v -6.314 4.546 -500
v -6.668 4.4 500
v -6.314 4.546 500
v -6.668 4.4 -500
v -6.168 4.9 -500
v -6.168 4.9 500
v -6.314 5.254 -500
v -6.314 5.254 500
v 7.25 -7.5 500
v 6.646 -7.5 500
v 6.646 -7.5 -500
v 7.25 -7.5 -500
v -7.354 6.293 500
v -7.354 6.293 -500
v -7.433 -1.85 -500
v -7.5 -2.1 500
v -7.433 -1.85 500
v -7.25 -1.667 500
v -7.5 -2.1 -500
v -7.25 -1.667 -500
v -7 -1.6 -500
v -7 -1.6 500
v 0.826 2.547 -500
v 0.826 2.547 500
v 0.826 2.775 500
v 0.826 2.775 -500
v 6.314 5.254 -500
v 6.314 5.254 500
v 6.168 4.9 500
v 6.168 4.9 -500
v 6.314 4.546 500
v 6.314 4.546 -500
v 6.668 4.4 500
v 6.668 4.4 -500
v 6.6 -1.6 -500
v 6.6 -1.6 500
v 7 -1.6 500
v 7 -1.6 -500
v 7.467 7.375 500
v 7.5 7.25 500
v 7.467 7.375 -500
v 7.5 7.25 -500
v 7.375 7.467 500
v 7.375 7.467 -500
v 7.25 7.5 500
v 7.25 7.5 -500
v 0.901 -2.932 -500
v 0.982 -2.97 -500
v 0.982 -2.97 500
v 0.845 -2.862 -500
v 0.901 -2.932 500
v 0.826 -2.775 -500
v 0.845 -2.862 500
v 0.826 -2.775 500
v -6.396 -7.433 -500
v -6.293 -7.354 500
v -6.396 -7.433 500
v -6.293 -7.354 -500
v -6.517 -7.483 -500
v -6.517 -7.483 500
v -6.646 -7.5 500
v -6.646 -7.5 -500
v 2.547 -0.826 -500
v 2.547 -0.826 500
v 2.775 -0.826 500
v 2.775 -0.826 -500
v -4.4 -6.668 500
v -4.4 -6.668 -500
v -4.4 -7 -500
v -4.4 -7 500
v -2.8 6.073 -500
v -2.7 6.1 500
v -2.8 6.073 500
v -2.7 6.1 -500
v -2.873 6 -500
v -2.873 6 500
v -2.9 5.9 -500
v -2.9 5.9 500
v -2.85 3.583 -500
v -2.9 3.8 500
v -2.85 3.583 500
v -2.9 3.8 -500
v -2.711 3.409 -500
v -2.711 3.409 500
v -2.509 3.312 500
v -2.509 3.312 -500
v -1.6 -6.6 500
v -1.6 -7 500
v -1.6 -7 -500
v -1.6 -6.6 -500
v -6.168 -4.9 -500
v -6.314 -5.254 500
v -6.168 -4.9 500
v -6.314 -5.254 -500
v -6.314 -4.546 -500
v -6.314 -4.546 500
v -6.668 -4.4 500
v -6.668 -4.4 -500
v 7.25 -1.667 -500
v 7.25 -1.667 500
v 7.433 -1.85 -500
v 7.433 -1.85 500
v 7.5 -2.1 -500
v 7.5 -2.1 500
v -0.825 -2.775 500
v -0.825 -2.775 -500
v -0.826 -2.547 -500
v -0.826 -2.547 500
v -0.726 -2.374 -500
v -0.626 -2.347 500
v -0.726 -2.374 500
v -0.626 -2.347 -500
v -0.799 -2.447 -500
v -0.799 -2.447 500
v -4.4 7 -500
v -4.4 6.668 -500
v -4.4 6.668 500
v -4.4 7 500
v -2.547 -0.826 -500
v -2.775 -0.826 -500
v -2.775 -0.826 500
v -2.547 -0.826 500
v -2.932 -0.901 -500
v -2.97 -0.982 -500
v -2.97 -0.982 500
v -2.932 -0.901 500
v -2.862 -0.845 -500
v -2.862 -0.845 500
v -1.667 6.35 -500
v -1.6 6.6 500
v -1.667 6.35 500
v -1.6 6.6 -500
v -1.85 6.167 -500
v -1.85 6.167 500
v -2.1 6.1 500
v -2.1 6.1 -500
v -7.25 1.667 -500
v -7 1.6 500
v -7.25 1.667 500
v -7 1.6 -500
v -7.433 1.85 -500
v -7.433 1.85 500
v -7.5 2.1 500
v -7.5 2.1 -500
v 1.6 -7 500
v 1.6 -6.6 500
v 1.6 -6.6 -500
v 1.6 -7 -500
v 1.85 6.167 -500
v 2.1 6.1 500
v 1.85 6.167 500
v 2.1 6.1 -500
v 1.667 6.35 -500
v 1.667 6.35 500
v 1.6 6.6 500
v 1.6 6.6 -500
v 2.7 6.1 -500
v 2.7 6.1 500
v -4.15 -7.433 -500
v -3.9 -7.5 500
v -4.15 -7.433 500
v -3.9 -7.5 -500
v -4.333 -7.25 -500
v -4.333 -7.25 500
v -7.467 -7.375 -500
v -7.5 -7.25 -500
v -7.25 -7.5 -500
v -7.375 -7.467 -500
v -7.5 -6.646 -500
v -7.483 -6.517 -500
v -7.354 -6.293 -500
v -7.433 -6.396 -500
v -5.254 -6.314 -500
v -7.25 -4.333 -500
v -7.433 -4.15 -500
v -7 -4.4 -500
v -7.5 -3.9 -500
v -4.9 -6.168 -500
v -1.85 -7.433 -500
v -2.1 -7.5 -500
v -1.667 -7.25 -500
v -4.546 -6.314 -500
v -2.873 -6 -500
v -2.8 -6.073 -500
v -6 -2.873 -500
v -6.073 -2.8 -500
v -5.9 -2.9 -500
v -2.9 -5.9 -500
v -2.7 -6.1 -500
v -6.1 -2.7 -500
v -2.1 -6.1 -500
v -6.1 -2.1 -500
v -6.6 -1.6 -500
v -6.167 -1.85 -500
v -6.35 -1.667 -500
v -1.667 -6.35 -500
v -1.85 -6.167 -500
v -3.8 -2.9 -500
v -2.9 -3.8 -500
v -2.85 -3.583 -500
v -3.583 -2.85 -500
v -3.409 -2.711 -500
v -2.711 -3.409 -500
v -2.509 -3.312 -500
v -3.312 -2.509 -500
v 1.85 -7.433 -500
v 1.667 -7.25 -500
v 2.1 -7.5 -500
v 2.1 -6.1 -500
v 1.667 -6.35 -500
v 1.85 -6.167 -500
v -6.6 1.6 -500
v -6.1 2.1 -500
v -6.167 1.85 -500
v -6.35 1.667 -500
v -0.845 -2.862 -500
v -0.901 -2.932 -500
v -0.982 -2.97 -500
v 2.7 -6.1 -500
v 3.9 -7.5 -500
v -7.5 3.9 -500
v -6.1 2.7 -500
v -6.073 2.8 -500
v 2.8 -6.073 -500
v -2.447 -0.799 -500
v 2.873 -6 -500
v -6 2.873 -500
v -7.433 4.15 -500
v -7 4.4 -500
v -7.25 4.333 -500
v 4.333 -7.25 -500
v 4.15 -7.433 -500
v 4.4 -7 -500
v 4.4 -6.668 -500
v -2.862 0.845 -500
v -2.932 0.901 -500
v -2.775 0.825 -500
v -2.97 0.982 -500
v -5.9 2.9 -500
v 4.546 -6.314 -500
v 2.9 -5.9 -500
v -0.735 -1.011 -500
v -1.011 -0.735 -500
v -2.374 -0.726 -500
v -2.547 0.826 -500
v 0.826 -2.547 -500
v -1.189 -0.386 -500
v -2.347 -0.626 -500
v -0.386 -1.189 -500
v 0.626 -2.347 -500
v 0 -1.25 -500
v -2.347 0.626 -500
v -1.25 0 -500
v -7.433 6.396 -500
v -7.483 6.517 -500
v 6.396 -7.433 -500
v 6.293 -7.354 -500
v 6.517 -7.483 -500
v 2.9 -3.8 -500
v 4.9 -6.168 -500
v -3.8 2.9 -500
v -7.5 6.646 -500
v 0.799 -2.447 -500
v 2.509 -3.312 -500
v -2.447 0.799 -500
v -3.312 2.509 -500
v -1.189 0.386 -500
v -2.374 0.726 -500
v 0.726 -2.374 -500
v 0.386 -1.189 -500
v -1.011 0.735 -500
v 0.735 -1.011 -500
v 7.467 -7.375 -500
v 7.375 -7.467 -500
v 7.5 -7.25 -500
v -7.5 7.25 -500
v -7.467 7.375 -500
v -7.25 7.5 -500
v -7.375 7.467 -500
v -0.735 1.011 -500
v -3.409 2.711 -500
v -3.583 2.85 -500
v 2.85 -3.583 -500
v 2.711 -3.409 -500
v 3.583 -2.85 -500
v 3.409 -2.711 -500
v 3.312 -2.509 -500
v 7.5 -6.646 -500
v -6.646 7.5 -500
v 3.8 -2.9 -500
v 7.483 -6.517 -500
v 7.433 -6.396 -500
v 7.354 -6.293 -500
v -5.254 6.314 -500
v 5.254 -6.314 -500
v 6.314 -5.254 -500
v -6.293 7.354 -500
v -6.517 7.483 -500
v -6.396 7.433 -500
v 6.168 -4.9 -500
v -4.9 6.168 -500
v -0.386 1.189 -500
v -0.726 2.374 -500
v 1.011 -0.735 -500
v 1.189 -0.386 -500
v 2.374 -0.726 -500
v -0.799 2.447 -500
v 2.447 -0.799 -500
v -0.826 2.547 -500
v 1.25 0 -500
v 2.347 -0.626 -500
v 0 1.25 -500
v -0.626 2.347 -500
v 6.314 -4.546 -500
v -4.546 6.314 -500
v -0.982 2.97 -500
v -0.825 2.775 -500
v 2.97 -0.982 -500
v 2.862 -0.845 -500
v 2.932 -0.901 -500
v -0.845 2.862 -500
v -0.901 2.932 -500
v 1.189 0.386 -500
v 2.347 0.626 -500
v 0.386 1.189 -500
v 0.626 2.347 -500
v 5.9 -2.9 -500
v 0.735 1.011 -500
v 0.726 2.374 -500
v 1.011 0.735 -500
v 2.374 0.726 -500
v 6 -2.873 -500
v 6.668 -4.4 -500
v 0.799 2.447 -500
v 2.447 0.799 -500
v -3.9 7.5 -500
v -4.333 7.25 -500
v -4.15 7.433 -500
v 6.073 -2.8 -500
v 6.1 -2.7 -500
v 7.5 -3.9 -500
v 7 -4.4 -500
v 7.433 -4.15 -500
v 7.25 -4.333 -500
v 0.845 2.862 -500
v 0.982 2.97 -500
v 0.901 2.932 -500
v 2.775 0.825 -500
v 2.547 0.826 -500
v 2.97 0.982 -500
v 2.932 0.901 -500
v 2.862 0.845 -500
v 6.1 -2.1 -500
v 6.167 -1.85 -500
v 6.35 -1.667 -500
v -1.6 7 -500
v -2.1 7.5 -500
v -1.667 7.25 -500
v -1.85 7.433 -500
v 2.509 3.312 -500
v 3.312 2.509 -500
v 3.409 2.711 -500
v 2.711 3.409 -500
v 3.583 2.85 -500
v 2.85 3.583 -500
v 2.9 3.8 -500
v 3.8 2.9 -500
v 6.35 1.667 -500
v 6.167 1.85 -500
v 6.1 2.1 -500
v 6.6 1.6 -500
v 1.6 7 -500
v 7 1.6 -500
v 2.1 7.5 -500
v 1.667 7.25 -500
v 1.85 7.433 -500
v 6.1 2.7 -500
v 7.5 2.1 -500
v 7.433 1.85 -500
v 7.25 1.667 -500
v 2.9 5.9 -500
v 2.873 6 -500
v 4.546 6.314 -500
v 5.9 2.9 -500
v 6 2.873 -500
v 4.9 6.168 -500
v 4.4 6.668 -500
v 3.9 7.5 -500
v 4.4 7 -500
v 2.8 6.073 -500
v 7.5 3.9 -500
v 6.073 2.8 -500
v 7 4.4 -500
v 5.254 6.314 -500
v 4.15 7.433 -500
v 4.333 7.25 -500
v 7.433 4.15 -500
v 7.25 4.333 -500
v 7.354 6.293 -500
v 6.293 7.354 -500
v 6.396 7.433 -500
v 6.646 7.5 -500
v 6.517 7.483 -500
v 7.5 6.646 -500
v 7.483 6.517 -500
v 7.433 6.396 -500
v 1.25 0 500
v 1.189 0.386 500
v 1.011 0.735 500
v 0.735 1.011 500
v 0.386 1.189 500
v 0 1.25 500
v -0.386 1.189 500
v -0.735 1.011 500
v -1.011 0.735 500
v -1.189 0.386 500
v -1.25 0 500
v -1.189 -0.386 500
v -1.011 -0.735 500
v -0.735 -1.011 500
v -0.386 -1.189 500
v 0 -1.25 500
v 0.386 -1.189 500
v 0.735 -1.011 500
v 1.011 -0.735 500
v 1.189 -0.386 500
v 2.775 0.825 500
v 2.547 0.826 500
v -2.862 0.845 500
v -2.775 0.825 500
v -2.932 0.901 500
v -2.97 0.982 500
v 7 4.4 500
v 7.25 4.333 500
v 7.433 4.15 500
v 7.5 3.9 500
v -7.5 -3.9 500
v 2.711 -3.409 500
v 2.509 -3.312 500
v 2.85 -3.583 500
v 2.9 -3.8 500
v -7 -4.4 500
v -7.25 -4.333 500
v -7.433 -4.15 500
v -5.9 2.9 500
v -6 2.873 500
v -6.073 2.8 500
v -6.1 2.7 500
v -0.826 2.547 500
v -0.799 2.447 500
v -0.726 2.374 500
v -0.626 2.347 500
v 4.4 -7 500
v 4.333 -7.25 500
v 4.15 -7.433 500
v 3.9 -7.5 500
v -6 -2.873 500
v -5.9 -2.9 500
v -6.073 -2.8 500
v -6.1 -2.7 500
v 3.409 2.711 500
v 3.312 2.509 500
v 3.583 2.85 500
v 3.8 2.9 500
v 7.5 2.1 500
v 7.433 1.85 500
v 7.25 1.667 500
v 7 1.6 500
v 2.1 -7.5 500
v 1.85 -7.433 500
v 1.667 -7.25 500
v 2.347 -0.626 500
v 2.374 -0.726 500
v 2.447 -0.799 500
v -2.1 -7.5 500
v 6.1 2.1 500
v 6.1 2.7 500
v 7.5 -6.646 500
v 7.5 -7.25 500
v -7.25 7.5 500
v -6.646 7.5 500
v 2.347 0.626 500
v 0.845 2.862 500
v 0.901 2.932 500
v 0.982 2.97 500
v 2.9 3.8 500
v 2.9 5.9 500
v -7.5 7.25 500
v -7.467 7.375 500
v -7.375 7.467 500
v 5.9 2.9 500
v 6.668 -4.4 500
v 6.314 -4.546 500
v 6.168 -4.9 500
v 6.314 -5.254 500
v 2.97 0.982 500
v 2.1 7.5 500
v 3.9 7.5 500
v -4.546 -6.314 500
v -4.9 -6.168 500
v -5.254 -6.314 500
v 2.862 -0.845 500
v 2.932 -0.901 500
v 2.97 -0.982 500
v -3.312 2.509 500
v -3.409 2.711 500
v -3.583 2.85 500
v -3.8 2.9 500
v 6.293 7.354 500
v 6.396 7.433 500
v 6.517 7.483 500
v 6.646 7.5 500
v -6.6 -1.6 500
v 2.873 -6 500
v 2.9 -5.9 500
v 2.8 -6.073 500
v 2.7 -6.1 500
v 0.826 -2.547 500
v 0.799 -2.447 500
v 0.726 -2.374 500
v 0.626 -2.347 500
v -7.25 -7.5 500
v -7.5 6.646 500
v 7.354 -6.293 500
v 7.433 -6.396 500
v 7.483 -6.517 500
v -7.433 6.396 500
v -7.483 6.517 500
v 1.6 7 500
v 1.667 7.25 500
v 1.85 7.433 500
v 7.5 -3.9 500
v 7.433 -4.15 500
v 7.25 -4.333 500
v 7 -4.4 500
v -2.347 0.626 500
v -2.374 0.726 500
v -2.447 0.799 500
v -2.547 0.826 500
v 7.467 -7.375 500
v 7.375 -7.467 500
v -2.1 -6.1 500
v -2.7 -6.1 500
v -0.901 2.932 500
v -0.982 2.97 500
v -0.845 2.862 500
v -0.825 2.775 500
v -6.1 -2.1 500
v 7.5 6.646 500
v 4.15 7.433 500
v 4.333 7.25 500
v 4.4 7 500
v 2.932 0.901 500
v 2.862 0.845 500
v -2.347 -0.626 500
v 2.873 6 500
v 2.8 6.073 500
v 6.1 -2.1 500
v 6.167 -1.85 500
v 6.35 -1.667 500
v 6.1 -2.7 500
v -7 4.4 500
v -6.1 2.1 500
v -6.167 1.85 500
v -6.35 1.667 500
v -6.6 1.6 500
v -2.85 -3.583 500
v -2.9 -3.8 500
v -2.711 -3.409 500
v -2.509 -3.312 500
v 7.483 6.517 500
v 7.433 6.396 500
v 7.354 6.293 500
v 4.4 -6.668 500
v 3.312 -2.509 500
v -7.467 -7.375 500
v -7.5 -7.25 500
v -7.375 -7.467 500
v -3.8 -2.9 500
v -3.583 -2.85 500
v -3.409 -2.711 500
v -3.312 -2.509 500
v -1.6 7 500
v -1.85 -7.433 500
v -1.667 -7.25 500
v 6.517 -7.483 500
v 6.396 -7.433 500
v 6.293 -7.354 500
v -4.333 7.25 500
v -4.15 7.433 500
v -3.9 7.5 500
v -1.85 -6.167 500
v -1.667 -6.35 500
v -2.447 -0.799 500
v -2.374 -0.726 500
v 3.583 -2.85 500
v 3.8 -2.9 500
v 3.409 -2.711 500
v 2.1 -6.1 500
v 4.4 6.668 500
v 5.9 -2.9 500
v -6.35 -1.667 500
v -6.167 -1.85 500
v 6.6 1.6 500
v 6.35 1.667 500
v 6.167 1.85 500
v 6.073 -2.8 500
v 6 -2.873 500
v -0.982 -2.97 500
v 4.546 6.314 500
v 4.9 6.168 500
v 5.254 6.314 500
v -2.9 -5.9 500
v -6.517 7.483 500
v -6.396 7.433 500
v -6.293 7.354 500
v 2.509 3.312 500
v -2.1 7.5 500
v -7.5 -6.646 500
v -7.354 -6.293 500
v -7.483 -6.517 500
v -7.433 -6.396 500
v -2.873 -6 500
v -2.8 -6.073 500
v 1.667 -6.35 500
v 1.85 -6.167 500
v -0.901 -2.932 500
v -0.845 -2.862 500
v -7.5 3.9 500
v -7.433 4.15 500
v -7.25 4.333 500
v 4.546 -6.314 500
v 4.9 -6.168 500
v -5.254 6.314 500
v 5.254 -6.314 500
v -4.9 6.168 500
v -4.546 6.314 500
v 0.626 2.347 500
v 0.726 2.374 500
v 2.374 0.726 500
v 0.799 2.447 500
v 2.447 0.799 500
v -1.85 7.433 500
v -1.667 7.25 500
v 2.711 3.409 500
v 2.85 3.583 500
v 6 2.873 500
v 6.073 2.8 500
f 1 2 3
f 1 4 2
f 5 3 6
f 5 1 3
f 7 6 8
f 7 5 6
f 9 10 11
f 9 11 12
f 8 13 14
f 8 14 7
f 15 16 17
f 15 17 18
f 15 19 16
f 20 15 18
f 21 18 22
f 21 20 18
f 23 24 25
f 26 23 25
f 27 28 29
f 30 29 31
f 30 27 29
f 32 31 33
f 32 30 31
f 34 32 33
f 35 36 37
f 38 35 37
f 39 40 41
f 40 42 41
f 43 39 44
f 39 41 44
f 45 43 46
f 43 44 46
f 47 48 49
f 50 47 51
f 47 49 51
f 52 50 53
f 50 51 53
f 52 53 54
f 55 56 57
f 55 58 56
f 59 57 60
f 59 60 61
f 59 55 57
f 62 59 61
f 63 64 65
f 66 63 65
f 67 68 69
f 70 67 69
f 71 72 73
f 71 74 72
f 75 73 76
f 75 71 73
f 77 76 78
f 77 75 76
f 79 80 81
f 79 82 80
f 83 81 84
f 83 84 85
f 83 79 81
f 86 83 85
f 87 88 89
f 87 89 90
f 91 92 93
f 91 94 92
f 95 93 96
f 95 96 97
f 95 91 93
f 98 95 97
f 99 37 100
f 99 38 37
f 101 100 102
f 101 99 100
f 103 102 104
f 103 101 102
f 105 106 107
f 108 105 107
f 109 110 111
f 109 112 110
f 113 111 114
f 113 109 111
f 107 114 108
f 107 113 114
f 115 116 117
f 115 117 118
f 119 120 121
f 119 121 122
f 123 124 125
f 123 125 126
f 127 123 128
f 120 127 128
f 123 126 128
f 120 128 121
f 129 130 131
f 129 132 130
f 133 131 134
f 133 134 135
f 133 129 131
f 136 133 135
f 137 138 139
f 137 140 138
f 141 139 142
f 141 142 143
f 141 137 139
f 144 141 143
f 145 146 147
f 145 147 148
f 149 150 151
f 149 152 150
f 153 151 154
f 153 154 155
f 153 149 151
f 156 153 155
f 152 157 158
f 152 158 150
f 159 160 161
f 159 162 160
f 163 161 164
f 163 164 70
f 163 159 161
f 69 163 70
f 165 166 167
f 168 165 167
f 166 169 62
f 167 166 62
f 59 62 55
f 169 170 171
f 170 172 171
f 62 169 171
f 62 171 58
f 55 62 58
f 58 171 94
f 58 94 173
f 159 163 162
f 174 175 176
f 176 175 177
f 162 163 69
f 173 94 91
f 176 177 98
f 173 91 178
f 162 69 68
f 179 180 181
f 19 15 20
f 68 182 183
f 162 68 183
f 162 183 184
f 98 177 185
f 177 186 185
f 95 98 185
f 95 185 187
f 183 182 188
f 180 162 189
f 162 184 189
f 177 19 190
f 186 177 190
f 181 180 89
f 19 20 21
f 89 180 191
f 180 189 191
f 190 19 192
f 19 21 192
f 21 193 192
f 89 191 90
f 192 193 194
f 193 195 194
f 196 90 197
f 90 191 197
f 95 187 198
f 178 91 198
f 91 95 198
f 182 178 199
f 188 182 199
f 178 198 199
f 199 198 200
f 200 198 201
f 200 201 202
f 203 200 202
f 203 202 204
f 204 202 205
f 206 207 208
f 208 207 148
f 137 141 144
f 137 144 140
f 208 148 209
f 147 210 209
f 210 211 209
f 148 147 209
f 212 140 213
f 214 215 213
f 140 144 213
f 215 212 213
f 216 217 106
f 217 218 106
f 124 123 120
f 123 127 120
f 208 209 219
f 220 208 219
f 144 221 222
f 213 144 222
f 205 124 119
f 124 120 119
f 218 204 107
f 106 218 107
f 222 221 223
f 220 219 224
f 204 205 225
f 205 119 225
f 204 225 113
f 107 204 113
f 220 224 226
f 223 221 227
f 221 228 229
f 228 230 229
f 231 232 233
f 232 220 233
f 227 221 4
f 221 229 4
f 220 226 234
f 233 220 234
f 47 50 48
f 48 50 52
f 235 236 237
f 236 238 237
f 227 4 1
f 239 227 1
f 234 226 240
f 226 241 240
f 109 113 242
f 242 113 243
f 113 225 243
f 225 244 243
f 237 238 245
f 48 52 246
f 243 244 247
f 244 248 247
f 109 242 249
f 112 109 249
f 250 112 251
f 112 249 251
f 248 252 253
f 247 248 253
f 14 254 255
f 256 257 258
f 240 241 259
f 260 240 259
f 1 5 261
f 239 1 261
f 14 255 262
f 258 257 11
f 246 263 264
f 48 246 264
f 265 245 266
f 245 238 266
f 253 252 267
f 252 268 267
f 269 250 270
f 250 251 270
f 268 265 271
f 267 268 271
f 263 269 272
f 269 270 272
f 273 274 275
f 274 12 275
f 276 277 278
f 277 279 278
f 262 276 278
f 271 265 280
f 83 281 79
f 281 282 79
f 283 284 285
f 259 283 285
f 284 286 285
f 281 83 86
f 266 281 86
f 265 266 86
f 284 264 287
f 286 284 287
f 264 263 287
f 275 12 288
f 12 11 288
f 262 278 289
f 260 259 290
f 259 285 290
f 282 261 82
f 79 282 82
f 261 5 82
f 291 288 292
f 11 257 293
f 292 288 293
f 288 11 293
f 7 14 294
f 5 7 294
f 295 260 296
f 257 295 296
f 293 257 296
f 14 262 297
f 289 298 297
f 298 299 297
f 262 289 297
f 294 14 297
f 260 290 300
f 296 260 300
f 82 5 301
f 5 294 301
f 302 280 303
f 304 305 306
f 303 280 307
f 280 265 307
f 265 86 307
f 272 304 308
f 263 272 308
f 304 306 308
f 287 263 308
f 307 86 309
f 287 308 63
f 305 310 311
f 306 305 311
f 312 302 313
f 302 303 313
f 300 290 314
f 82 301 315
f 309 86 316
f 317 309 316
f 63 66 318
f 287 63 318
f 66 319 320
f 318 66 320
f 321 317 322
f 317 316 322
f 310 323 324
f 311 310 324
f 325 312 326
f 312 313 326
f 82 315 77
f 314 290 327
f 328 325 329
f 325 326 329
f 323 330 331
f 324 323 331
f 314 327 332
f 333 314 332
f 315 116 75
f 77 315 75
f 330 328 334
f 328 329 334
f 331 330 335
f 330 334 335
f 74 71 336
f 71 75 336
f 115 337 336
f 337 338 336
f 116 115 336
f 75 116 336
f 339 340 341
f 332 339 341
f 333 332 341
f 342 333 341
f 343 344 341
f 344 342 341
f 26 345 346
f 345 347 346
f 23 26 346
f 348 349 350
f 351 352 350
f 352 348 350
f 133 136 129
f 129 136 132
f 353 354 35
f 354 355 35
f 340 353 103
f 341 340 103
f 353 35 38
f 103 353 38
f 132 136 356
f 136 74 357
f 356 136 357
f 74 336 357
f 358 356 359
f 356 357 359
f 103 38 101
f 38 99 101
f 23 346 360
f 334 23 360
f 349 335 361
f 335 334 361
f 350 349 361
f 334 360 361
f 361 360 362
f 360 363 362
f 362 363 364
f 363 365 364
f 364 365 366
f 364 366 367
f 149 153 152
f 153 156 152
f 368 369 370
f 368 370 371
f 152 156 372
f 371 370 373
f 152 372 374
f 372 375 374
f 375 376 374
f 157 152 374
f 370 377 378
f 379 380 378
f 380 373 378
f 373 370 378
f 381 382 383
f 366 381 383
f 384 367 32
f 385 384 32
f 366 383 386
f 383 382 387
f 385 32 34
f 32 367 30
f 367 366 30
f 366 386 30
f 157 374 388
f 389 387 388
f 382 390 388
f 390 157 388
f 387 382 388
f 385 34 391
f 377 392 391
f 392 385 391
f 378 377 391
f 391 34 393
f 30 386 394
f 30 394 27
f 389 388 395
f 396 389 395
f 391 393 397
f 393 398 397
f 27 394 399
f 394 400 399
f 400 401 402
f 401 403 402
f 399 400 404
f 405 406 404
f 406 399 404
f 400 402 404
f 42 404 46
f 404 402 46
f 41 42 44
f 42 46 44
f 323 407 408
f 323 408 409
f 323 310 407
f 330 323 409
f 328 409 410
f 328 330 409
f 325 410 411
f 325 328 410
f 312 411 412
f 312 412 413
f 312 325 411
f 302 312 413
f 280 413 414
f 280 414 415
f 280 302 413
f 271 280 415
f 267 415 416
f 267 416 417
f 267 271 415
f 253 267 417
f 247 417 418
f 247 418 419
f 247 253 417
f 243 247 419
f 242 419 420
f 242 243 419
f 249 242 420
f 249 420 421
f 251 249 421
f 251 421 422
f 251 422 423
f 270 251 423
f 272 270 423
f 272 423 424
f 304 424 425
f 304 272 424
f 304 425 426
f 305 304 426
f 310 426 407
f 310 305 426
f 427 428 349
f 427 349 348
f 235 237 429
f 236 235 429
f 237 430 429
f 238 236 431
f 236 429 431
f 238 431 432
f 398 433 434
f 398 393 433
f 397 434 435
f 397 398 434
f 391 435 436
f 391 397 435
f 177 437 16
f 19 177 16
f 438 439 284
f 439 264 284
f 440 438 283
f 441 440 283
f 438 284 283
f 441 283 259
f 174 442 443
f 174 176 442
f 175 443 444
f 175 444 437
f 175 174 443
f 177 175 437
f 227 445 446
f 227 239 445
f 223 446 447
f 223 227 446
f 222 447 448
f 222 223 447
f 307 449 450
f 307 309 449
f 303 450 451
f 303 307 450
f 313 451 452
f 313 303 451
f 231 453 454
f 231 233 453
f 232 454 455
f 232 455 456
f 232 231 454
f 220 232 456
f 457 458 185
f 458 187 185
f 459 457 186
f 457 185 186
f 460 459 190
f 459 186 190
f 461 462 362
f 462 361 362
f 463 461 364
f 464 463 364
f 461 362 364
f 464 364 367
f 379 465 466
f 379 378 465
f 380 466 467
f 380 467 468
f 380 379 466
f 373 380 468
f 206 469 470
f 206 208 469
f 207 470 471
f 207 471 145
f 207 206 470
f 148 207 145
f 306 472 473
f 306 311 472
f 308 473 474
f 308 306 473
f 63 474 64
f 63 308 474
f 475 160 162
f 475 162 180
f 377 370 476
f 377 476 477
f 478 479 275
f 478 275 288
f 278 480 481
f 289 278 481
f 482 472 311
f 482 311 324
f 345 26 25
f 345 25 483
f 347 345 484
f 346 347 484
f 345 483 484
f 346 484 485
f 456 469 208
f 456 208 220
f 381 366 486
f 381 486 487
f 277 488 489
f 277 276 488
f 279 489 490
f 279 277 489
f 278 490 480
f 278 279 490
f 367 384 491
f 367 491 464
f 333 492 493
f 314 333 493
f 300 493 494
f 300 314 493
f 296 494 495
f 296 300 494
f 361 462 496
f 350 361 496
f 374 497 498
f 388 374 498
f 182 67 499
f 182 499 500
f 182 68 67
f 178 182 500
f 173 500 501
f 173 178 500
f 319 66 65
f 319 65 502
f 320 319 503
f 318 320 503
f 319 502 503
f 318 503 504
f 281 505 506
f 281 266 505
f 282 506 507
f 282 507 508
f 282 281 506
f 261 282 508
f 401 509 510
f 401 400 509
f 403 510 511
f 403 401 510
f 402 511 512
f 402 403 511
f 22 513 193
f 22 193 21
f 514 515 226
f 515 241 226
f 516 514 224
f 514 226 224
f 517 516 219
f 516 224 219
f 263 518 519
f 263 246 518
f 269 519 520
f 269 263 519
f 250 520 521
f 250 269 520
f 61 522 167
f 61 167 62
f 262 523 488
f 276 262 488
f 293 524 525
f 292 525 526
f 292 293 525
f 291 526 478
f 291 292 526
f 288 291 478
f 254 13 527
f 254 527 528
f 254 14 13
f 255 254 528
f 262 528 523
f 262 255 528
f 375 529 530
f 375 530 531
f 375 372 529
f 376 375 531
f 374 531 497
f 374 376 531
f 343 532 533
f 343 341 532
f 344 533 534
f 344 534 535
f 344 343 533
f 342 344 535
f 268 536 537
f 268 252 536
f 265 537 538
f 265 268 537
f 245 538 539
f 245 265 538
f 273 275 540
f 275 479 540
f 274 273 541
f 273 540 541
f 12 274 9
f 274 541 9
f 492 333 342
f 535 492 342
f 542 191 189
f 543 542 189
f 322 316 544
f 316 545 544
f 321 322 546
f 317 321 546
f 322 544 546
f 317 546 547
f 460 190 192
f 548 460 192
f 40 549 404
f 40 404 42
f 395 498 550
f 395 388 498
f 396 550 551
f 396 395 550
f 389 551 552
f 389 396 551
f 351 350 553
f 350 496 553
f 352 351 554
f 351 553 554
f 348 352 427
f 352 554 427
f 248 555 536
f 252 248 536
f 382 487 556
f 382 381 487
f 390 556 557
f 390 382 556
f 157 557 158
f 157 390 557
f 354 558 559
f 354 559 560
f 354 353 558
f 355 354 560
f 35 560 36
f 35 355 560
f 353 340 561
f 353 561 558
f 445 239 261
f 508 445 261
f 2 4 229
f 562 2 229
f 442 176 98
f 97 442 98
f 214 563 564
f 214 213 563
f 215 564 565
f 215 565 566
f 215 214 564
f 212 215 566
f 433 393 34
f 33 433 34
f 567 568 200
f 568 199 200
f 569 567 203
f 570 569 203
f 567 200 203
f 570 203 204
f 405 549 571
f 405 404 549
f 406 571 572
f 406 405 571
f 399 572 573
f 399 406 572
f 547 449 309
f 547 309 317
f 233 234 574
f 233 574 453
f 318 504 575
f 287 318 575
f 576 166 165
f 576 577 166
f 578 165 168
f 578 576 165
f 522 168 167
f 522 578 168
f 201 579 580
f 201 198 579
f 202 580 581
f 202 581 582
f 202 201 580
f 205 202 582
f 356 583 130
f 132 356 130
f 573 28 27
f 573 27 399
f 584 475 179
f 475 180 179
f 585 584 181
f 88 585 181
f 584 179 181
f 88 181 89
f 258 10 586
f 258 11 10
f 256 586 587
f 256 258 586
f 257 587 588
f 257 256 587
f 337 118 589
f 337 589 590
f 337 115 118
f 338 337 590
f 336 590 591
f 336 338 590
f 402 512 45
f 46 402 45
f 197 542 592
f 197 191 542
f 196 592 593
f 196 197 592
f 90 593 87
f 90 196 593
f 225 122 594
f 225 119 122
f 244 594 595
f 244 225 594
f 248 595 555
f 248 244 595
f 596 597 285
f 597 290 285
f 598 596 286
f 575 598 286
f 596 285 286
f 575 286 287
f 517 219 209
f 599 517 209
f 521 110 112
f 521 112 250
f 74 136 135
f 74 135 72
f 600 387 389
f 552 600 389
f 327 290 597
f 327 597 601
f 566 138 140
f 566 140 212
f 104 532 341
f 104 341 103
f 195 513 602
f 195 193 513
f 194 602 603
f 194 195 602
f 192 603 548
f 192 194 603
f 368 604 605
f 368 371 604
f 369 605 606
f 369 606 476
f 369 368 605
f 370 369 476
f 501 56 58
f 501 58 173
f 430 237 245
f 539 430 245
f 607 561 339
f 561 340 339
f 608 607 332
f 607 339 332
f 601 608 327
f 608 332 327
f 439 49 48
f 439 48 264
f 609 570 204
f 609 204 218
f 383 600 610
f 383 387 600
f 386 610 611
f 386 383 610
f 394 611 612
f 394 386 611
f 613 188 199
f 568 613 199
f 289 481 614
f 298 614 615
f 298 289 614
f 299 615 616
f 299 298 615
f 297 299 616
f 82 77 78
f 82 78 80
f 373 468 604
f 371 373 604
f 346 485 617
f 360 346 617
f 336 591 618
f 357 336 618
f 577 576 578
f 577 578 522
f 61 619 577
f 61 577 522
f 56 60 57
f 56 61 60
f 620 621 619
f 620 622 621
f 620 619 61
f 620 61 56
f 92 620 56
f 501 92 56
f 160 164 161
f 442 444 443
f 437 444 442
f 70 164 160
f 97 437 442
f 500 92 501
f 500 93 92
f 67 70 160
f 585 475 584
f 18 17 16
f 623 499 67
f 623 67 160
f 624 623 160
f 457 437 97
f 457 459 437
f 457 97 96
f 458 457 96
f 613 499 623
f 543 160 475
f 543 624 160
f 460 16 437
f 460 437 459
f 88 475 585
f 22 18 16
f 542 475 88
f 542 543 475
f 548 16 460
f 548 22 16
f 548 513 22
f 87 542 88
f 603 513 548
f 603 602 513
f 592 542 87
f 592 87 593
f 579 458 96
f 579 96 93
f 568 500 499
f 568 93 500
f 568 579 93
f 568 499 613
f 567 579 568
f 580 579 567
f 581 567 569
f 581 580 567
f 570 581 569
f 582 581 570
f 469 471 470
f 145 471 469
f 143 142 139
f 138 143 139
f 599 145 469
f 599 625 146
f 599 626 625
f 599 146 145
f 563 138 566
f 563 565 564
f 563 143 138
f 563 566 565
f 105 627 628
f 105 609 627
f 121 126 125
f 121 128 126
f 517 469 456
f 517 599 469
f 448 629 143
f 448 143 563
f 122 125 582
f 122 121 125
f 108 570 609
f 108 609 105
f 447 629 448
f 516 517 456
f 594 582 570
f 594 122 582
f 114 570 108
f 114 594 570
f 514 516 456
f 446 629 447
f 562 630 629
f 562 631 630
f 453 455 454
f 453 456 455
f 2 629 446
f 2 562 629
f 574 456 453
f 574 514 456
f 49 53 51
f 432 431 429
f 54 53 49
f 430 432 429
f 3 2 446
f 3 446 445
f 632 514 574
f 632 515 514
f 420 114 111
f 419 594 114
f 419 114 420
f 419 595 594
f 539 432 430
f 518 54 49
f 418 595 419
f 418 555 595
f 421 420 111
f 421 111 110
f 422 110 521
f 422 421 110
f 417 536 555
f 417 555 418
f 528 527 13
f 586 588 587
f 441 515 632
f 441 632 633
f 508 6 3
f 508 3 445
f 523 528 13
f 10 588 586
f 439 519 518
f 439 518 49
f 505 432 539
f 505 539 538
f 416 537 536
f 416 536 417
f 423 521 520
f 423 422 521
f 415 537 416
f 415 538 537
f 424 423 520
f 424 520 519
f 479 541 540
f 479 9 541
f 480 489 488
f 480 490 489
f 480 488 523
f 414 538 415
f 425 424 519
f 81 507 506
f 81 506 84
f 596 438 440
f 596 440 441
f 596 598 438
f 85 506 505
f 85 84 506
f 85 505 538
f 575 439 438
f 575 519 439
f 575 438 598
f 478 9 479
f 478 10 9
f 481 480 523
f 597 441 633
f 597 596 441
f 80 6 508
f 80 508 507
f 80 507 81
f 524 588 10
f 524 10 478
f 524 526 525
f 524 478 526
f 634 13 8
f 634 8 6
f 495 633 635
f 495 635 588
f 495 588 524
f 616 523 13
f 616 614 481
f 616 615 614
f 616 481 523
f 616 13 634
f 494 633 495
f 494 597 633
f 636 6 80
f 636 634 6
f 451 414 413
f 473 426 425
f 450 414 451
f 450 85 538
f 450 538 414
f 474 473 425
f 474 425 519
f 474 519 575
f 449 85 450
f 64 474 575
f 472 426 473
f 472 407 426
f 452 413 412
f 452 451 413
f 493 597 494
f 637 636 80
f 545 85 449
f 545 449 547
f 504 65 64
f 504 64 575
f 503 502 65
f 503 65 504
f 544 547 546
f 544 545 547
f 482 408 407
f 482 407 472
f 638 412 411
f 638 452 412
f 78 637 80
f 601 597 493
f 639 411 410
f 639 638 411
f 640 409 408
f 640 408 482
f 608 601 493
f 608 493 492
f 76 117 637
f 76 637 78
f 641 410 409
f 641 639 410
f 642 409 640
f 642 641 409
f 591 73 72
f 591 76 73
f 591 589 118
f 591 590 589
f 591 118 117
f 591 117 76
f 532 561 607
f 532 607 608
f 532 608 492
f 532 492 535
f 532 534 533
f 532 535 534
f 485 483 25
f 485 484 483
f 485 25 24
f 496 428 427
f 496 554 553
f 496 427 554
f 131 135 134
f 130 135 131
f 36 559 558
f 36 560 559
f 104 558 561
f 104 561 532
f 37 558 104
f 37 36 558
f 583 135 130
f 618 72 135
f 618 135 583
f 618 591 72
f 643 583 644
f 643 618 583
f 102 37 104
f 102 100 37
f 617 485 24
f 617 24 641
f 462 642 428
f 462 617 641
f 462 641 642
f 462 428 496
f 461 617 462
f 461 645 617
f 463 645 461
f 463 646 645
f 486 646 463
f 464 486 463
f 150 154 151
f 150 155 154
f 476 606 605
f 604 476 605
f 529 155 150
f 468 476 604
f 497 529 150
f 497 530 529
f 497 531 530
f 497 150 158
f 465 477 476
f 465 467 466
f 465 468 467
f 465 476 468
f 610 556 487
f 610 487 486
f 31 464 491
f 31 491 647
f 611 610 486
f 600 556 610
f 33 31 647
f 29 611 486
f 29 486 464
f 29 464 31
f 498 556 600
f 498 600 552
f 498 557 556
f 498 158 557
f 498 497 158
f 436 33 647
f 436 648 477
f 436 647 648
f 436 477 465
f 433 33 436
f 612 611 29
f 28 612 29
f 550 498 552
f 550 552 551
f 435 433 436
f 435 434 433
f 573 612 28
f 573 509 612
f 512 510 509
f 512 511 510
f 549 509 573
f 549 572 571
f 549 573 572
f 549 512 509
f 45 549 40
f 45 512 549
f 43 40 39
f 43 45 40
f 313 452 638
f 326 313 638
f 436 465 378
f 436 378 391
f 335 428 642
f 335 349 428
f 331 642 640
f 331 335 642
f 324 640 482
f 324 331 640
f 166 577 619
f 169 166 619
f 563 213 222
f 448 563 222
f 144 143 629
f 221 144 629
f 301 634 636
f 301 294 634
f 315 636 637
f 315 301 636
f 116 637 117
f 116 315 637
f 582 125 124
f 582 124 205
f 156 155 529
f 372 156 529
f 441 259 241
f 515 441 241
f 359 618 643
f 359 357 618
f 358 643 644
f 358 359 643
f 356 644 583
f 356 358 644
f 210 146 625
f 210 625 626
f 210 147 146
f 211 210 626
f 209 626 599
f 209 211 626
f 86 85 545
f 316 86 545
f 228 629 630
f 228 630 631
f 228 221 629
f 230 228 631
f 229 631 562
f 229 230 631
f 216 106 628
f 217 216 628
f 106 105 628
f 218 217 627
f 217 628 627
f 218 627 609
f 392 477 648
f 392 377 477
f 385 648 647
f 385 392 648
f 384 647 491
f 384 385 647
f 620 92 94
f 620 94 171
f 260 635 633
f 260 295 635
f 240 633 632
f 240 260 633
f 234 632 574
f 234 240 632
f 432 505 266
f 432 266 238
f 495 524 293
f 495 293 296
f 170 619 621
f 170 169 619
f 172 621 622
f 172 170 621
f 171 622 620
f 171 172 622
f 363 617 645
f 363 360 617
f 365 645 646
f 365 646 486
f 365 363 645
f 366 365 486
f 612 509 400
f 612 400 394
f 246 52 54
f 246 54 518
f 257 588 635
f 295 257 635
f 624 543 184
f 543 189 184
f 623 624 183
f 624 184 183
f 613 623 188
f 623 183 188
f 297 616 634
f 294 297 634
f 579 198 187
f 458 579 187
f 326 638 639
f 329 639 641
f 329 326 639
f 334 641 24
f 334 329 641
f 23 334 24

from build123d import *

# Parameters (mm, degrees)
SKETCH1_W           = 15
SKETCH1_H           = 15
SKETCH1_R           = 1.25
BOSS_EXTRUDE1_DEPTH = 500
FILLET1_R           = 0.25
CUT_EXTRUDE1_DEPTH  = 1001
CUT_EXTRUDE3_DEPTH  = 1001
FILLET3_R           = 0.5
FILLET4_R           = 0.5
FILLET5_R           = 3
FILLET6_R           = 0.2
CUT_EXTRUDE4_DEPTH  = 1001
FILLET8_R           = 0.5
SKETCH6_W           = 5.1529354
SKETCH6_H           = 1.651
SKETCH6_W_2         = 1.651
SKETCH6_H_2         = 5.1529354
CUT_EXTRUDE5_DEPTH  = 1001
FILLET10_R          = 0.2


with BuildPart() as part:
    # Sketch1 → Boss-Extrude1 (new body, symmetric)
    with BuildSketch(Plane.XY):
        Rectangle(SKETCH1_W, SKETCH1_H)
        Circle(SKETCH1_R, mode=Mode.SUBTRACT)
    extrude(amount=BOSS_EXTRUDE1_DEPTH, both=True)

    # Fillet1
    fillet1_edges = [part.edges().sort_by_distance(p)[0] for p in [
        (7.5, -7.5, 0),
        (-7.5, -7.5, 0),
        (-7.5, 7.5, 0),
        (7.5, 7.5, 0),
    ]]
    fillet(fillet1_edges, radius=FILLET1_R)

    # Sketch2 → Cut-Extrude1 (cut, through all)
    with BuildSketch(Plane.XY.offset(500)):
        Polygon((-7.5, 1.6), (-6.1, 1.6), (-6.1, 2.9), (-3.4, 2.9), (-3.4, -2.9), (-6.1, -2.9), (-6.1, -1.6), (-7.5, -1.6), align=None)
        Polygon((2.9, 6.1), (1.6, 6.1), (1.6, 7.5), (-1.6, 7.5), (-1.6, 6.1), (-2.9, 6.1), (-2.9, 3.4), (2.9, 3.4), align=None)
        Polygon((-1.6, -7.5), (-1.6, -6.1), (-2.9, -6.1), (-2.9, -3.4), (2.9, -3.4), (2.9, -6.1), (1.6, -6.1), (1.6, -7.5), align=None)
        Polygon((6.1, -2.9), (6.1, -1.6), (7.5, -1.6), (7.5, 1.6), (6.1, 1.6), (6.1, 2.9), (3.4, 2.9), (3.4, -2.9), align=None)
    extrude(amount=-CUT_EXTRUDE1_DEPTH, mode=Mode.SUBTRACT)

    # Sketch4 → Cut-Extrude3 (cut, through all)
    with BuildSketch(Plane.XY.offset(500)):
        Polygon((-3.4, 2.9), (-2.75, 0), (-3.4, -2.9), align=None)
        Polygon((-2.9, 3.4), (0, 2.75), (2.9, 3.4), align=None)
        Polygon((3.4, 2.9), (2.75, 0), (3.4, -2.9), align=None)
        Polygon((-2.9, -3.4), (0, -2.75), (2.9, -3.4), align=None)
    extrude(amount=-CUT_EXTRUDE3_DEPTH, mode=Mode.SUBTRACT)

    # Fillet3
    fillet3_edges = [part.edges().sort_by_distance(p)[0] for p in [
        (1.6, -7.5, 0),
        (-1.6, -7.5, 0),
        (-1.6, -6.1, 0),
        (1.6, -6.1, 0),
        (6.1, 1.6, 0),
        (7.5, 1.6, 0),
        (7.5, -1.6, 0),
        (6.1, -1.6, 0),
        (-7.5, -1.6, 0),
        (-7.5, 1.6, 0),
        (-6.1, 1.6, 0),
        (-6.1, -1.6, 0),
        (-1.6, 6.1, 0),
        (-1.6, 7.5, 0),
        (1.6, 7.5, 0),
        (1.6, 6.1, 0),
    ]]
    fillet(fillet3_edges, radius=FILLET3_R)

    # Fillet4
    fillet4_edges = [part.edges().sort_by_distance(p)[0] for p in [
        (-2.9, -3.4, 0),
        (2.9, -3.4, 0),
        (3.4, -2.9, 0),
        (3.4, 2.9, 0),
        (-3.4, 2.9, 0),
        (-3.4, -2.9, 0),
        (2.9, 3.4, 0),
        (-2.9, 3.4, 0),
    ]]
    fillet(fillet4_edges, radius=FILLET4_R)

    # Fillet5
    fillet5_edges = [part.edges().sort_by_distance(p)[0] for p in [
        (-2.75, 0, 0),
        (0, 2.75, 0),
        (2.75, 0, 0),
        (0, -2.75, 0),
    ]]
    fillet(fillet5_edges, radius=FILLET5_R)

    # Fillet6
    fillet6_edges = [part.edges().sort_by_distance(p)[0] for p in [
        (-2.9, -6.1, 0),
        (2.9, -6.1, 0),
        (6.1, -2.9, 0),
        (6.1, 2.9, 0),
        (-6.1, 2.9, 0),
        (-6.1, -2.9, 0),
        (2.9, 6.1, 0),
        (-2.9, 6.1, 0),
    ]]
    fillet(fillet6_edges, radius=FILLET6_R)

    # Sketch5 → Cut-Extrude4 (cut, through all)
    with BuildSketch(Plane.XY.offset(500)):
        Polygon((-7.5, 6.439339828), (-5.460660172, 4.4), (-7.5, 4.4), align=None)
        Polygon((-6.439339828, 7.5), (-4.4, 5.460660172), (-4.4, 7.5), align=None)
        Polygon((4.4, 7.5), (6.439339828, 7.5), (4.4, 5.460660172), align=None)
        Polygon((7.5, 6.439339828), (7.5, 4.4), (5.460660172, 4.4), align=None)
        Polygon((7.5, -6.439339828), (5.460660172, -4.4), (7.5, -4.4), align=None)
        Polygon((6.439339828, -7.5), (4.4, -5.460660172), (4.4, -7.5), align=None)
        Polygon((-4.4, -7.5), (-6.439339828, -7.5), (-4.4, -5.460660172), align=None)
        Polygon((-7.5, -6.439339828), (-7.5, -4.4), (-5.460660172, -4.4), align=None)
    extrude(amount=-CUT_EXTRUDE4_DEPTH, mode=Mode.SUBTRACT)

    # Fillet8
    fillet8_edges = [part.edges().sort_by_distance(p)[0] for p in [
        (-7.5, 4.4, 0),
        (-7.5, 6.439339828, 0),
        (-5.460660172, 4.4, 0),
        (7.5, -4.4, 0),
        (7.5, -6.439339828, 0),
        (5.460660172, -4.4, 0),
        (5.460660172, 4.4, 0),
        (7.5, 6.439339828, 0),
        (7.5, 4.4, 0),
        (-4.4, 7.5, 0),
        (-4.4, 5.460660172, 0),
        (-6.439339828, 7.5, 0),
        (-5.460660172, -4.4, 0),
        (-7.5, -6.439339828, 0),
        (-7.5, -4.4, 0),
        (4.4, 5.460660172, 0),
        (4.4, 7.5, 0),
        (6.439339828, 7.5, 0),
        (6.439339828, -7.5, 0),
        (4.4, -7.5, 0),
        (4.4, -5.460660172, 0),
        (-6.439339828, -7.5, 0),
        (-4.4, -5.460660172, 0),
        (-4.4, -7.5, 0),
    ]]
    fillet(fillet8_edges, radius=FILLET8_R)

    # Sketch6 → Cut-Extrude5 (cut, through all)
    with BuildSketch(Plane.XY.offset(500)):
        with Locations((4.9235323, 0)):
            Rectangle(SKETCH6_W, SKETCH6_H)
        with Locations((0, -4.9235323)):
            Rectangle(SKETCH6_W_2, SKETCH6_H_2)
        with Locations((-4.9235323, 0)):
            Rectangle(SKETCH6_W, SKETCH6_H)
        with Locations((0, 4.9235323)):
            Rectangle(SKETCH6_W_2, SKETCH6_H_2)
    extrude(amount=-CUT_EXTRUDE5_DEPTH, mode=Mode.SUBTRACT)

    # Fillet10
    fillet10_edges = [part.edges().sort_by_distance(p)[0] for p in [
        (0.8255, -2.935025862, 0),
        (-0.8255, -2.935025862, 0),
        (0.8255, -2.3470646, 0),
        (-0.8255, -2.3470646, 0),
        (2.935025862, 0.8255, 0),
        (2.935025862, -0.8255, 0),
        (2.3470646, 0.8255, 0),
        (2.3470646, -0.8255, 0),
        (-2.935025862, -0.8255, 0),
        (-2.935025862, 0.8255, 0),
        (-2.3470646, -0.8255, 0),
        (-2.3470646, 0.8255, 0),
        (-0.8255, 2.935025862, 0),
        (0.8255, 2.935025862, 0),
        (-0.8255, 2.3470646, 0),
        (0.8255, 2.3470646, 0),
    ]]
    fillet(fillet10_edges, radius=FILLET10_R)


solid = part.part
